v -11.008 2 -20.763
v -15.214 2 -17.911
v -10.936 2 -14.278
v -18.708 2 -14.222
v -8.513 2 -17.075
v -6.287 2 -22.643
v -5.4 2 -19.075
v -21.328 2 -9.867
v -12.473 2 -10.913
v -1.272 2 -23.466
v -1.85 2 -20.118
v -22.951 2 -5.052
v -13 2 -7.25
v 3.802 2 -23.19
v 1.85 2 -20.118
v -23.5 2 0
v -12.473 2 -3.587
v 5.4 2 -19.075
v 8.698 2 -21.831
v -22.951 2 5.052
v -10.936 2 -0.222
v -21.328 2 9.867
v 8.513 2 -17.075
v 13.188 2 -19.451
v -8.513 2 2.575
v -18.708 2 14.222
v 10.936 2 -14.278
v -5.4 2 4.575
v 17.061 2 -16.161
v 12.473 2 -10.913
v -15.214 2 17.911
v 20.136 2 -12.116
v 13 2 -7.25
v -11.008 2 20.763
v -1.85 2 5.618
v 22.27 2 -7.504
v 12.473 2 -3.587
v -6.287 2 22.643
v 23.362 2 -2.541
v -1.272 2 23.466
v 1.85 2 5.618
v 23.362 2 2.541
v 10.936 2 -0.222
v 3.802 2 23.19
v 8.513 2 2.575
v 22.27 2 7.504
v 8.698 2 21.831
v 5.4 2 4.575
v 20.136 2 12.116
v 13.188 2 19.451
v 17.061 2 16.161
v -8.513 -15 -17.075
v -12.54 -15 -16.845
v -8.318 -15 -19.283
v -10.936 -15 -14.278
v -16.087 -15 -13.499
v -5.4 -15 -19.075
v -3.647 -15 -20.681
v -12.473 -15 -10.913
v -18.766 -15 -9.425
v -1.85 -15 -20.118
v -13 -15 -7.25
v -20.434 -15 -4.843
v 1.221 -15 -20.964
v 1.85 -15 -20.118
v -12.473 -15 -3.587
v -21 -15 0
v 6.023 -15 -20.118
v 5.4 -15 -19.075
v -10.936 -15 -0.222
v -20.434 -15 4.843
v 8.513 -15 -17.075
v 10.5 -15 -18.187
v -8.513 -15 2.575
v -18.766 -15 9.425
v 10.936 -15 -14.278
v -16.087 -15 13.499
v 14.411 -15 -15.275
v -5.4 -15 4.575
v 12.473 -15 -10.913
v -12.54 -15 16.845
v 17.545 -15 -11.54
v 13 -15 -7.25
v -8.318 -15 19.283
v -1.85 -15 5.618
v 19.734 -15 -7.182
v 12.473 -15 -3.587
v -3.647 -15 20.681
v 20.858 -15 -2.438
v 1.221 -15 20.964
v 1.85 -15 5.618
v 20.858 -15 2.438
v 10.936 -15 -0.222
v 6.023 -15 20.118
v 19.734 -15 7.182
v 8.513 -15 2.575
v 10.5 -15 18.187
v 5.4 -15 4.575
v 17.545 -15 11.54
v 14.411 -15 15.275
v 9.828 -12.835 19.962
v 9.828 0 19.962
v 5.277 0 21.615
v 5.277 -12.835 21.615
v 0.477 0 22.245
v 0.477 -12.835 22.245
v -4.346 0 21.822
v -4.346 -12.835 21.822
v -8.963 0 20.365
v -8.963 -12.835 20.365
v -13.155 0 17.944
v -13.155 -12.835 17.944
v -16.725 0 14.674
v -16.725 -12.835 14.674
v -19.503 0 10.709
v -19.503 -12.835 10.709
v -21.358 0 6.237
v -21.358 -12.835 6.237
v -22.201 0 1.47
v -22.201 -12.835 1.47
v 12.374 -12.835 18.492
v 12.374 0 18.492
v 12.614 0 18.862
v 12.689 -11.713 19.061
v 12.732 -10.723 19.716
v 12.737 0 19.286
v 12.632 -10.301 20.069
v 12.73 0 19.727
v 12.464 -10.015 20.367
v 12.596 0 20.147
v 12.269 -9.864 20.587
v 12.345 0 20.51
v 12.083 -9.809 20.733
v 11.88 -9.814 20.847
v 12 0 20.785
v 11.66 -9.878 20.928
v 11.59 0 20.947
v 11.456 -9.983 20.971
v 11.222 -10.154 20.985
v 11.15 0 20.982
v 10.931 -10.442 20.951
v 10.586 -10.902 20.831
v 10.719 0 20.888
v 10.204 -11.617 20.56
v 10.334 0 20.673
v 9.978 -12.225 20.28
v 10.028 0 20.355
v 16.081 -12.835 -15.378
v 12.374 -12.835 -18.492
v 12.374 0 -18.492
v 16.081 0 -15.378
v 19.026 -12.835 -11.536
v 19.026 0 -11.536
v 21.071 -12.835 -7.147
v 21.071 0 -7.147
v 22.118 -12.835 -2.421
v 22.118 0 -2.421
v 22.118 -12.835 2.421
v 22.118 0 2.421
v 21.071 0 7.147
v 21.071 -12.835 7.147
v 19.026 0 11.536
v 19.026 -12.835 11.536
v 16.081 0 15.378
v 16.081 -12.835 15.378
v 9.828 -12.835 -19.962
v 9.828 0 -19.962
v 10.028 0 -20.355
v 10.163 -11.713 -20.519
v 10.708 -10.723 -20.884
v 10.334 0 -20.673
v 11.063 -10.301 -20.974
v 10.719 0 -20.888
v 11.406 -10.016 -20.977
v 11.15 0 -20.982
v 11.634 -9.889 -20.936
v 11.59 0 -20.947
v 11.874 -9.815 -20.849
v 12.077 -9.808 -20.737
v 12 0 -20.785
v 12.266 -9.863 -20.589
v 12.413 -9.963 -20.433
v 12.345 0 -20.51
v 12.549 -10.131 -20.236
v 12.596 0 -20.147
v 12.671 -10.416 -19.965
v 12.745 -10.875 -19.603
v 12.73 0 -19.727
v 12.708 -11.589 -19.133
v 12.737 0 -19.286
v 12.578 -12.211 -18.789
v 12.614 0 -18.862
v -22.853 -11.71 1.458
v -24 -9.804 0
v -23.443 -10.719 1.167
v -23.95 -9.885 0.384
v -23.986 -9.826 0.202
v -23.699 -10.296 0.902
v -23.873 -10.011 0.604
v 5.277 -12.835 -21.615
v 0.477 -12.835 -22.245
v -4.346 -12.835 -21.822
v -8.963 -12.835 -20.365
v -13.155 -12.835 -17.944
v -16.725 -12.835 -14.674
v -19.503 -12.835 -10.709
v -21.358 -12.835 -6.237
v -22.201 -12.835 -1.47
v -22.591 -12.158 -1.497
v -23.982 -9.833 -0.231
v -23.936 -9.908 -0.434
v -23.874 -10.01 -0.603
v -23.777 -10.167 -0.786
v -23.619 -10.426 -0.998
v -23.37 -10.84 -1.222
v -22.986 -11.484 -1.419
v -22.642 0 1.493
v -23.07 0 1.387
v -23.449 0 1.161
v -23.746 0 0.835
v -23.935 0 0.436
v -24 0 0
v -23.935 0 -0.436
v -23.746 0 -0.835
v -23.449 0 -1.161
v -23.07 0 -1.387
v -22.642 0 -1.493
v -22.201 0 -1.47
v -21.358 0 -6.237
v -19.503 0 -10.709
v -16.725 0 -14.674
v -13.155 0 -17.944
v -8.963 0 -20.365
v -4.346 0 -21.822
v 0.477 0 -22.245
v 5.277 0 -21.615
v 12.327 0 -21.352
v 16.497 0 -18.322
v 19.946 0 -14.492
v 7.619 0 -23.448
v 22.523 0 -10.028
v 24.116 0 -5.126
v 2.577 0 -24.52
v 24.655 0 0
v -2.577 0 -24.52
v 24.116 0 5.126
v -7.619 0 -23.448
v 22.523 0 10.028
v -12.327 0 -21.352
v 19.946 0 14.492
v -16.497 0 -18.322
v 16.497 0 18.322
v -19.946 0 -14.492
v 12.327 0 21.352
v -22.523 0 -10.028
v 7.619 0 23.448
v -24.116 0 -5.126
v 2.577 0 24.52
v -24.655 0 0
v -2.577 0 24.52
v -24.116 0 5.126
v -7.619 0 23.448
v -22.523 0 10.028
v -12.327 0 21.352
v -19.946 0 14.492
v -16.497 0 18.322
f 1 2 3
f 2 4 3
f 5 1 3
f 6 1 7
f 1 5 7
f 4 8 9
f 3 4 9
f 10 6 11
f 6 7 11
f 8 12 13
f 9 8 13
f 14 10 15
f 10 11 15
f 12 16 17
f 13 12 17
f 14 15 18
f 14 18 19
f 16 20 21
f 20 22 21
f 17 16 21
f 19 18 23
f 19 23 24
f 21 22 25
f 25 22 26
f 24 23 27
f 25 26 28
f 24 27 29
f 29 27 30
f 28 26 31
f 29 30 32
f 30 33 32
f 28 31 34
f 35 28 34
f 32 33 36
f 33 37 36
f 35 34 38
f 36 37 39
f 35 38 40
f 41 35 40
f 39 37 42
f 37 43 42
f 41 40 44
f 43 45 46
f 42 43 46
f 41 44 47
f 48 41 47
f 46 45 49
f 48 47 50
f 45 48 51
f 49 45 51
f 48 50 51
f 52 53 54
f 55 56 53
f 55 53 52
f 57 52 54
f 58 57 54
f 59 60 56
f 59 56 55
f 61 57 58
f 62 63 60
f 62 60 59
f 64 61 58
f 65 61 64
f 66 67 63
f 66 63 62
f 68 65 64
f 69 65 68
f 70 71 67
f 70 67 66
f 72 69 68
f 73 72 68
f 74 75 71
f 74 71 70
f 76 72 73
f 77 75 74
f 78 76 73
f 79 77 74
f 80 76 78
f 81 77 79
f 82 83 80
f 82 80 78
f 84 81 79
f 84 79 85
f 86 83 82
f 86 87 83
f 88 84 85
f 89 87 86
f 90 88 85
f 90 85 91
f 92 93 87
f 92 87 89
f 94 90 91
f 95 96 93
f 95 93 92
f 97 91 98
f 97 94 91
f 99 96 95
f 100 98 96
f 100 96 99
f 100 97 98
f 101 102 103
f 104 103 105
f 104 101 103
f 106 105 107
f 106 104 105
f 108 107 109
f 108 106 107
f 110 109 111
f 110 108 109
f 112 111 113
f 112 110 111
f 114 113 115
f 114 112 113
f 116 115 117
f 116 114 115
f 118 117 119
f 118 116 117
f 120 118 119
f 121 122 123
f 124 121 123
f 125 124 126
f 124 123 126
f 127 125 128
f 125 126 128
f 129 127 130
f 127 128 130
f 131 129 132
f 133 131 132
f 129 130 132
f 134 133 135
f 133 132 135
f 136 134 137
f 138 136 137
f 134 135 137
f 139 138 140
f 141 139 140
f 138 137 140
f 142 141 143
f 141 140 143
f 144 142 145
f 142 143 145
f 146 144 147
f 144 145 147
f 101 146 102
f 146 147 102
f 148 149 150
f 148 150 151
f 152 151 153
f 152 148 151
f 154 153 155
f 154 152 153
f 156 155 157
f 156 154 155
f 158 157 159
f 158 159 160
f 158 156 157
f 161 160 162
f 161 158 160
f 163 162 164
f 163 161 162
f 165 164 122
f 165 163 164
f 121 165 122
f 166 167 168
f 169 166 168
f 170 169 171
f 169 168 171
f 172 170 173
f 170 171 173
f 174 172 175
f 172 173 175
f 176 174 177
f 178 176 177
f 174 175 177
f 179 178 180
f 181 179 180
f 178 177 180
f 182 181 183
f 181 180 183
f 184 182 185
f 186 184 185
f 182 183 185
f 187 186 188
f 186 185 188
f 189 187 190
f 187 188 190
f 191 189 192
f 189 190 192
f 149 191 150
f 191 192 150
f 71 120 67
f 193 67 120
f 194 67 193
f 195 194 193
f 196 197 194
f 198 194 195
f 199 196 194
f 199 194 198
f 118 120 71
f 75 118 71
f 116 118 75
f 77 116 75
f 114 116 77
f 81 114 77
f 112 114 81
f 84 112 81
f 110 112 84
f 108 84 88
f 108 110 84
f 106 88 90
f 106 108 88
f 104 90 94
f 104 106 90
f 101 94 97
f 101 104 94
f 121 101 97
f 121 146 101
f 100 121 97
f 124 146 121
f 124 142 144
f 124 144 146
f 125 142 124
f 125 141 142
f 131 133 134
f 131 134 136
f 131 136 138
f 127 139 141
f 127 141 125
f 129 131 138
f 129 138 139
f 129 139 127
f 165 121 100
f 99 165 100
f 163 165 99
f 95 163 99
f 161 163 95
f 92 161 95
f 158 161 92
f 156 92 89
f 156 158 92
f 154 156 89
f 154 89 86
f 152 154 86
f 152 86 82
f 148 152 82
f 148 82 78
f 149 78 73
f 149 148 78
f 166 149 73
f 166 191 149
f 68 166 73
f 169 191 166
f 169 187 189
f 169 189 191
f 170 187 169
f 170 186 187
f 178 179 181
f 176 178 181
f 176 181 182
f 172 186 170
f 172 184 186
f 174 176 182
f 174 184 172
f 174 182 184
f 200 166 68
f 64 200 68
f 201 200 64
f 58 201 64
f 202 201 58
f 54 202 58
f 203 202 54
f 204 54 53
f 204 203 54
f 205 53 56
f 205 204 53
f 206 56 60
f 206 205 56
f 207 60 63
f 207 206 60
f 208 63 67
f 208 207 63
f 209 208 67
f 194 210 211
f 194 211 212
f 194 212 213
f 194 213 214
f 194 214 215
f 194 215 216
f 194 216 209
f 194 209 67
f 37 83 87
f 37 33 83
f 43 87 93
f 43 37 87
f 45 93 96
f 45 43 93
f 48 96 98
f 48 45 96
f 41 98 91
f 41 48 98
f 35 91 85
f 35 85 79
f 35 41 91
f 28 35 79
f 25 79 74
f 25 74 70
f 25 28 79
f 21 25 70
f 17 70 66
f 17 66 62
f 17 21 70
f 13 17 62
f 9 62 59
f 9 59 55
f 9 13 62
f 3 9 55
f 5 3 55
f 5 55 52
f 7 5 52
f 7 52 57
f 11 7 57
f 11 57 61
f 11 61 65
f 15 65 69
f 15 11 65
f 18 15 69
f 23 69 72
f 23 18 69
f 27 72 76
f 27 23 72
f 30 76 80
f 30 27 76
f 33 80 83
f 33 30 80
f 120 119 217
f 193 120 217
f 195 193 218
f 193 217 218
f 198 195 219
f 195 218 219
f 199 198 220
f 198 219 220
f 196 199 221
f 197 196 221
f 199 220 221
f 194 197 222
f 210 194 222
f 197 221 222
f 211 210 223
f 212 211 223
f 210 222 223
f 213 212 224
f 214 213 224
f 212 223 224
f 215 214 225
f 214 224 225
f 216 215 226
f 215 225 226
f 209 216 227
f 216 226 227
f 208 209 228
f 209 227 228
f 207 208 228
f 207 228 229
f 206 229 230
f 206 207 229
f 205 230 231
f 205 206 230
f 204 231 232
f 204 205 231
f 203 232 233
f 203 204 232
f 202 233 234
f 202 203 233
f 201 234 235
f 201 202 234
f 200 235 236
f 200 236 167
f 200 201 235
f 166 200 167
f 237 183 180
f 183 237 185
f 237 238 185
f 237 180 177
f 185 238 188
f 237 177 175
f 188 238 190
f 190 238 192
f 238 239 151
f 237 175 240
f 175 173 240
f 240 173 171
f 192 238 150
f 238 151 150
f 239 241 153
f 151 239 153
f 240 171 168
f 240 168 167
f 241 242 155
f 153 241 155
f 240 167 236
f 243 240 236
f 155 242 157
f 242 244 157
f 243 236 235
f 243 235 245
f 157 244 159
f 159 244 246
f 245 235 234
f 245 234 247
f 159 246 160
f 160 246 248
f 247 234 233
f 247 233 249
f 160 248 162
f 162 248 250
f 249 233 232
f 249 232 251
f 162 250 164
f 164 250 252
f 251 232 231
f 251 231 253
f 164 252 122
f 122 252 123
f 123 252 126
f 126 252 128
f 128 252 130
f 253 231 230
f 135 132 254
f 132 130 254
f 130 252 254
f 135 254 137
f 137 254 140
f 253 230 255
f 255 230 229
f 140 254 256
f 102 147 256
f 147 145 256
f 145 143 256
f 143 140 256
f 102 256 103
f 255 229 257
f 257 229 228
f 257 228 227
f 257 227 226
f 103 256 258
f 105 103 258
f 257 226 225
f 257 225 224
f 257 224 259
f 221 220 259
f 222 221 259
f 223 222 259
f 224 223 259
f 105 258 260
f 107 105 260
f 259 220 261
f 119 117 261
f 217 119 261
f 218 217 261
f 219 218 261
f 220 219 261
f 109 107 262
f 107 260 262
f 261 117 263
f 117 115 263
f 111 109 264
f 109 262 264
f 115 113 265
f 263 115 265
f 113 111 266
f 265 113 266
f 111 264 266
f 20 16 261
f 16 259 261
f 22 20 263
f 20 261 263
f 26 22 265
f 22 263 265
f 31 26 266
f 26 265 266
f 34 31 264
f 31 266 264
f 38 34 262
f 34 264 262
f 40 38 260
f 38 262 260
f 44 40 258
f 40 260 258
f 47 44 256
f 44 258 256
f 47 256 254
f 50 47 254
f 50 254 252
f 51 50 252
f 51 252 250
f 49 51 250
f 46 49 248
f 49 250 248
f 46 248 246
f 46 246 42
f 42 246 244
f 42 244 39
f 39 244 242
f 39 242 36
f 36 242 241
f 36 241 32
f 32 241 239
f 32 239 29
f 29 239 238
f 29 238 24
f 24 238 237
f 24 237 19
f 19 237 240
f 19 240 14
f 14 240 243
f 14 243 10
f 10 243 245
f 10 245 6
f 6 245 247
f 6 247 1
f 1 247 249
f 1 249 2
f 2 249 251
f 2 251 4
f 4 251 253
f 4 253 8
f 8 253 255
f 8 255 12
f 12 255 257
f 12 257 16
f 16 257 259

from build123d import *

# Parameters (mm, degrees)
F0_R          = 22.25
F0_R_2        = 13
F1_DEPTH      = 15
F1_DEPTH_BACK = 2
F4_R          = 1.5
F5_DEPTH      = 15


with BuildPart() as f1:
    # F0 (on Front) → F1 (new body, two sides)
    with BuildSketch(Plane.XZ) as f1_sk:
        Circle(F0_R)
        with Locations((0, -7.25)):
            Circle(F0_R_2, mode=Mode.SUBTRACT)
    extrude(amount=F1_DEPTH)
    extrude(f1_sk.sketch, amount=-F1_DEPTH_BACK)

    # F2 (on Top) → F3 (revolve)
    with BuildSketch(Plane.XY):
        Polygon((-24.6547005384, 0), (-21.5, 0), (-21.5, 2), (-23.5, 2), align=None)
    revolve(axis=Axis((0, 0, 0), (0, 1, 0)))

    # F4 (on Front) → F5 (join, through all)
    with BuildSketch(Plane.XZ):
        with Locations((-22.5, 0)):
            Circle(F4_R)
        with Locations((11.25, -19.4855715851)):
            Circle(F4_R)
        with Locations((11.25, 19.4855715851)):
            Circle(F4_R)
    extrude(amount=F5_DEPTH)

    # F6 (on Top) → F7 (revolve, cut)
    with BuildSketch(Plane.XY):
        Polygon((-24.8129580218, -15), (-21, -15), (-24.8129580218, -8.3957629791), align=None)
    revolve(axis=Axis((0, 0, 0), (0, 1, 0)), mode=Mode.SUBTRACT)


solid = f1.part
